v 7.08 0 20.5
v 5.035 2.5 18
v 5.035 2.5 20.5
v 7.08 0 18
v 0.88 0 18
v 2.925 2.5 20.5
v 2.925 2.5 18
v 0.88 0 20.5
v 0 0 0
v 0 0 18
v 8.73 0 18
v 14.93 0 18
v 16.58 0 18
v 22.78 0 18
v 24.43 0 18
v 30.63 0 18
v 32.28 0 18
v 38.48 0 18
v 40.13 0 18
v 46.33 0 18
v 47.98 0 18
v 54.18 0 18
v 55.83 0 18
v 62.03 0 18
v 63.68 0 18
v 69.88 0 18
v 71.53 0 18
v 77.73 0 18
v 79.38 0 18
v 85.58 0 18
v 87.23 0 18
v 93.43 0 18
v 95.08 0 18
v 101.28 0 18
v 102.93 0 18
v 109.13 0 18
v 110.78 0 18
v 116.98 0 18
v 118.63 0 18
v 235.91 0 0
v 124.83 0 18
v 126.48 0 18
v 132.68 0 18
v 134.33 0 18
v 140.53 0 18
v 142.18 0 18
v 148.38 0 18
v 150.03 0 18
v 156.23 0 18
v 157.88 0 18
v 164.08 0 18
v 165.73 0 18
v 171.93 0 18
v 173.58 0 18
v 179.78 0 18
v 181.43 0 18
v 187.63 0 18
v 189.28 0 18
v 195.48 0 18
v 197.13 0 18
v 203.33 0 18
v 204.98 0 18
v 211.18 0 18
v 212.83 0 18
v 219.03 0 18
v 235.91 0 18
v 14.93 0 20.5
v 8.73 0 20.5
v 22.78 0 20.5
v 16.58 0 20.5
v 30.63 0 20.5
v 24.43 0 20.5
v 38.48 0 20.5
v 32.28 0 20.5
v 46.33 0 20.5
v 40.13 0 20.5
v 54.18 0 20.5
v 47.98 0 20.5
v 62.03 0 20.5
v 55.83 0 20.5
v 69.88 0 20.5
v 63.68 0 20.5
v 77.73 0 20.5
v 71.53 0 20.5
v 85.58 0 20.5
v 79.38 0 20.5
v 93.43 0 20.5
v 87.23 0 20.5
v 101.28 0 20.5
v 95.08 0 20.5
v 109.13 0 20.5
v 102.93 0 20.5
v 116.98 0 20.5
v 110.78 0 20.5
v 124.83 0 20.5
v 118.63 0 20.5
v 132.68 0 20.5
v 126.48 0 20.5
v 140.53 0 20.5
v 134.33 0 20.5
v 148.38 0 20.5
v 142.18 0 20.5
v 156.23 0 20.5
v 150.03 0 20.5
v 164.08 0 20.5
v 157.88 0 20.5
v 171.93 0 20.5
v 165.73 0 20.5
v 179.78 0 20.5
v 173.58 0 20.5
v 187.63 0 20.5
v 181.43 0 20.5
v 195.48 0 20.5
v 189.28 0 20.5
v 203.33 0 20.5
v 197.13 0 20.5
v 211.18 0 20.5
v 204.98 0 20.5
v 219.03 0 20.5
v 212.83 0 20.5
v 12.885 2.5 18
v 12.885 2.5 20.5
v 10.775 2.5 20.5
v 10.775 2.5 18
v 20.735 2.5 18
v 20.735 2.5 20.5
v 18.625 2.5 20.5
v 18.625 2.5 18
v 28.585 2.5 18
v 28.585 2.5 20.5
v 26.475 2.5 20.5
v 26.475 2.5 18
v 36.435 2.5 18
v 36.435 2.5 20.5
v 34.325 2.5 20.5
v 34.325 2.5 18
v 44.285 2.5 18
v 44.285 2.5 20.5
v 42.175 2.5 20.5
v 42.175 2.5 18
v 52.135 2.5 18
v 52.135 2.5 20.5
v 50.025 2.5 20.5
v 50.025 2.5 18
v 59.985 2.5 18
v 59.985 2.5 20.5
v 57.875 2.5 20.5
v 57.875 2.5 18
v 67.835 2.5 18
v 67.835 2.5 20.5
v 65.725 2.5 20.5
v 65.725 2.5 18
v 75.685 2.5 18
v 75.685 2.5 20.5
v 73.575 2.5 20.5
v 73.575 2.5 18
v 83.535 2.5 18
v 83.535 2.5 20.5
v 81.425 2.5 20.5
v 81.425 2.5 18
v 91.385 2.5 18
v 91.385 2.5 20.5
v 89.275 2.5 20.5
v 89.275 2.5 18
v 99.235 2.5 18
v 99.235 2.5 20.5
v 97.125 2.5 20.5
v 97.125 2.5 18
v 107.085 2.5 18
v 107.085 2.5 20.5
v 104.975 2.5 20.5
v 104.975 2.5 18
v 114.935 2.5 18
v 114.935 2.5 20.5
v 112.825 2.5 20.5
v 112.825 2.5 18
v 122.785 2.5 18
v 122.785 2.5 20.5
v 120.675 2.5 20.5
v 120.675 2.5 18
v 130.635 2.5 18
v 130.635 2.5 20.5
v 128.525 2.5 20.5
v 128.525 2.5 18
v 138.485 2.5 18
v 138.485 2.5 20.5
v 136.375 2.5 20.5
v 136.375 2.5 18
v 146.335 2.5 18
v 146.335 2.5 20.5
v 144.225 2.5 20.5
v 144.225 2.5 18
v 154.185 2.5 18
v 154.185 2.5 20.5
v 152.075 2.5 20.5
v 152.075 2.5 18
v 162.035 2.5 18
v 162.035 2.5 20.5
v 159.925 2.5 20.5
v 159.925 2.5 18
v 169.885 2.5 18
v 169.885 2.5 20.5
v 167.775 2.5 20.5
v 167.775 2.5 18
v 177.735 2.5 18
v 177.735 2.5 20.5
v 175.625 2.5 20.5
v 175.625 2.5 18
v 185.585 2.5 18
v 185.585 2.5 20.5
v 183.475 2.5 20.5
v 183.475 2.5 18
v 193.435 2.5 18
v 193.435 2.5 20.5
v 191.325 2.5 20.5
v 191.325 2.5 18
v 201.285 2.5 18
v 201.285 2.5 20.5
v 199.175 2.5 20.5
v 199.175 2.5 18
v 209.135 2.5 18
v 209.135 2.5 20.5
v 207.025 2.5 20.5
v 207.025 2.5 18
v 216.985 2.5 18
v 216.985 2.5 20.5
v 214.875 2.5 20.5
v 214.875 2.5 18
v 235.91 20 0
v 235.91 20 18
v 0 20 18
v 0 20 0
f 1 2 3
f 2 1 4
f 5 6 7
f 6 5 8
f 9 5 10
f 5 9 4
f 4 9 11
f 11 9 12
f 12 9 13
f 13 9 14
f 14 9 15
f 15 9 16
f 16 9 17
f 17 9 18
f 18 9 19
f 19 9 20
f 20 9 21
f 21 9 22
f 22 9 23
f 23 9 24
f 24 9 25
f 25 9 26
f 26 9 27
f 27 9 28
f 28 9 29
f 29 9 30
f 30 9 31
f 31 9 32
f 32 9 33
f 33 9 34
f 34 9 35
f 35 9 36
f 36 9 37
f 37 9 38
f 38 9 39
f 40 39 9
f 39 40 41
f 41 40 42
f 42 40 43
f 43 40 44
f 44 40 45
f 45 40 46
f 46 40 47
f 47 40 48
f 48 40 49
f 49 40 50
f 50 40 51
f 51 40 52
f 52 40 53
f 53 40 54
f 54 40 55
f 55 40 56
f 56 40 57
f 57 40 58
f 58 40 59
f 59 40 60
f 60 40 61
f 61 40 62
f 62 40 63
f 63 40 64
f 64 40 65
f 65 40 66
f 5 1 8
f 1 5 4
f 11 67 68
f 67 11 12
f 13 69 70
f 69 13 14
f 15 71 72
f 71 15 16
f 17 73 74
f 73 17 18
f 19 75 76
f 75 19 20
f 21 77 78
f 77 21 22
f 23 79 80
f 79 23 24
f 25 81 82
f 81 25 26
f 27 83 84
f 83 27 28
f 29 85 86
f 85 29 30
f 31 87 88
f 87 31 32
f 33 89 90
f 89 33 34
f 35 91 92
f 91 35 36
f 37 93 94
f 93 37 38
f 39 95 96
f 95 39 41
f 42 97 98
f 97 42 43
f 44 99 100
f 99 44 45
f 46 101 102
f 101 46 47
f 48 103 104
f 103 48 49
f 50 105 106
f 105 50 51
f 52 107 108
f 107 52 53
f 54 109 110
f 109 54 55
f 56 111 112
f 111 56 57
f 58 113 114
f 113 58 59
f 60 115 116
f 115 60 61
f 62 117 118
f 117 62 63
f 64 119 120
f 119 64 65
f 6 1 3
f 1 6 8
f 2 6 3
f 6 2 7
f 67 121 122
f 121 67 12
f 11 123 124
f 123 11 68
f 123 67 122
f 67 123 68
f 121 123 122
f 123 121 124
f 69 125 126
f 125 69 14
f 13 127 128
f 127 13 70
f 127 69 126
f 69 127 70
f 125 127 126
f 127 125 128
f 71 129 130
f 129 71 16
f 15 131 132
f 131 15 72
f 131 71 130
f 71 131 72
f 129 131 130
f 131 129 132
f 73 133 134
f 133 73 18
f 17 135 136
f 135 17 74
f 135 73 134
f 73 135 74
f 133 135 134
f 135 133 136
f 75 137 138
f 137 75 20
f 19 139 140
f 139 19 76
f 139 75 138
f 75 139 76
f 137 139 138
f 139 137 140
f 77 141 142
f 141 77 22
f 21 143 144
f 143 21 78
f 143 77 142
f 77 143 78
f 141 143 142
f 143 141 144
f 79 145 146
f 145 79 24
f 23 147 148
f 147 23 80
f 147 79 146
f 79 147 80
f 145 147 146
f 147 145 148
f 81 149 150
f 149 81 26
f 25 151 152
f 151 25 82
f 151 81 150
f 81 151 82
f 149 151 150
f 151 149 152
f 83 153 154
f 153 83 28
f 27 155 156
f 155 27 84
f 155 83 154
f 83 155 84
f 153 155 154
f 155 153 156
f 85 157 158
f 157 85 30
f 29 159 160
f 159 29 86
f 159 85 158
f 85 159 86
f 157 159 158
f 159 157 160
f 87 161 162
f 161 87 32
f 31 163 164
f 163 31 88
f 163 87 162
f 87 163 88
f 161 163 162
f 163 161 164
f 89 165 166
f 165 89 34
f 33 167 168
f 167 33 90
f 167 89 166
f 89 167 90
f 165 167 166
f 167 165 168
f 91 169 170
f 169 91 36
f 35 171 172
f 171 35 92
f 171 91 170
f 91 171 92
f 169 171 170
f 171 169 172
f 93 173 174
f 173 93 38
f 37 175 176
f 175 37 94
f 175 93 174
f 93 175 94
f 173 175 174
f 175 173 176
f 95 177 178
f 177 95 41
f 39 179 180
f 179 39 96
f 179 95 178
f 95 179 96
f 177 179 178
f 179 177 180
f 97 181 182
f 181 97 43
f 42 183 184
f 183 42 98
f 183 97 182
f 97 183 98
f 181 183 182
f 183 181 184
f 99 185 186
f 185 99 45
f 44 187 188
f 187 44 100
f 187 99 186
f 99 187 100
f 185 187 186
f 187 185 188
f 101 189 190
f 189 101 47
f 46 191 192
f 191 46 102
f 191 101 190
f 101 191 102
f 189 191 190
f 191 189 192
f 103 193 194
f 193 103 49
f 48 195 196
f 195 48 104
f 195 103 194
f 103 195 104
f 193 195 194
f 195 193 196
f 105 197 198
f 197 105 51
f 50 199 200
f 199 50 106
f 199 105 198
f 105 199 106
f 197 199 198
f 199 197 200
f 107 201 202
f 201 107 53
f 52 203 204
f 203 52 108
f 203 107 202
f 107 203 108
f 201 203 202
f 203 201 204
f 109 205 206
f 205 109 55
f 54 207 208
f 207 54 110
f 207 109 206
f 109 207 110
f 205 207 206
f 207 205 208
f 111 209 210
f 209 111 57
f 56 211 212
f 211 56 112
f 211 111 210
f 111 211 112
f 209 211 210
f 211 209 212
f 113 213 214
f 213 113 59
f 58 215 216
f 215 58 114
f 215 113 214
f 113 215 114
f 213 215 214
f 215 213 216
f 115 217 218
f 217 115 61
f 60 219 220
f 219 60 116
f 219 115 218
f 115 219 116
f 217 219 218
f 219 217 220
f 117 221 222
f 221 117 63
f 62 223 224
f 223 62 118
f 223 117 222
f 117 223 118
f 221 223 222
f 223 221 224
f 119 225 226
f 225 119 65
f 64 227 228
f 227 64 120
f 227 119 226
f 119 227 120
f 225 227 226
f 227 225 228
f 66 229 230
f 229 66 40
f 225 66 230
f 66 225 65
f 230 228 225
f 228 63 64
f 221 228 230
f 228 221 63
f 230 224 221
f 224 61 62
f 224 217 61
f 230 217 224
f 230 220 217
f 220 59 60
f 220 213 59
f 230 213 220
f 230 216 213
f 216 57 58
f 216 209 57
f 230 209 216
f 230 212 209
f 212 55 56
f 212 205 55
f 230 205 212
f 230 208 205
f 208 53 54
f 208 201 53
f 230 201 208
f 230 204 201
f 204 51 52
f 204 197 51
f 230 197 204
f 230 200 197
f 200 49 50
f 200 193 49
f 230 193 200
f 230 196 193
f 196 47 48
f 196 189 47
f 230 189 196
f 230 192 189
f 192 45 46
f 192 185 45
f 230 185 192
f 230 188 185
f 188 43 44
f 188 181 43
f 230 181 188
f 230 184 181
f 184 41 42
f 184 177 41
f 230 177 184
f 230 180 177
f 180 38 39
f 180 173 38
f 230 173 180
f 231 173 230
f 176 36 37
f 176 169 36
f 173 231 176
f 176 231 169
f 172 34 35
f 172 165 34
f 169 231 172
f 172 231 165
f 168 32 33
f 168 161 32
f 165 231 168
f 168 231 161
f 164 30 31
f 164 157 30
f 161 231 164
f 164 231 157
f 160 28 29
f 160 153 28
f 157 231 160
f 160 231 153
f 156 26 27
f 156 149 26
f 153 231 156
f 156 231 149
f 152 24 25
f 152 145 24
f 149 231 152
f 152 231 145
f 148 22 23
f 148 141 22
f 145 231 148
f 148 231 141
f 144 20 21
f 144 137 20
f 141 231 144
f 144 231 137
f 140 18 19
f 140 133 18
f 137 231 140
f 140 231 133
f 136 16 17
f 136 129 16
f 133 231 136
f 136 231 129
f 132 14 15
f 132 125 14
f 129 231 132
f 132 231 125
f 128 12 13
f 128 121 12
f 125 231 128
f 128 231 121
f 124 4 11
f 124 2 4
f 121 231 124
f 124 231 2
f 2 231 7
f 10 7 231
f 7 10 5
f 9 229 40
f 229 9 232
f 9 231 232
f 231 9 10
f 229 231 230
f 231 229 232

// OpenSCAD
$fn = 32;

// ----------------------------------------------------------------------
// Gear rack: m=2.5 z=28, 235.91 x 20 x 20.5 mm
// ----------------------------------------------------------------------

// --- parameters (mm) ---
length = 235.91;          // rack length, X
width = 20;               // rack width, Y
height = 20.5;            // overall height, Z
module_m = 2.5;           // module
back_t = 18;              // tooth root line height
pitch = 7.85;             // circular pitch
tip_w = 2.11;             // tooth thickness at the tip
root_w = 6.2;             // tooth thickness at the root line
sink = 0.6;               // tooth root overlap into the body

tooth_span = 219.91;

module tooth(x0) {
  /* 20 deg flank profile, sunk into the body for a positive overlap */
  translate([x0, 0, back_t - sink])
    linear_extrude(height = height - back_t + sink)
      polygon(points = [[-root_w / 2, 0], [root_w / 2, 0],
                        [tip_w / 2, height - back_t],
                        [-tip_w / 2, height - back_t]]);
}

difference() {
  union() {
    cube([length, width, back_t]);
    for (i = [0 : 28 - 1])
      tooth((i + 0.5) * pitch + (tooth_span - 28 * pitch) / 2);
  }
}
